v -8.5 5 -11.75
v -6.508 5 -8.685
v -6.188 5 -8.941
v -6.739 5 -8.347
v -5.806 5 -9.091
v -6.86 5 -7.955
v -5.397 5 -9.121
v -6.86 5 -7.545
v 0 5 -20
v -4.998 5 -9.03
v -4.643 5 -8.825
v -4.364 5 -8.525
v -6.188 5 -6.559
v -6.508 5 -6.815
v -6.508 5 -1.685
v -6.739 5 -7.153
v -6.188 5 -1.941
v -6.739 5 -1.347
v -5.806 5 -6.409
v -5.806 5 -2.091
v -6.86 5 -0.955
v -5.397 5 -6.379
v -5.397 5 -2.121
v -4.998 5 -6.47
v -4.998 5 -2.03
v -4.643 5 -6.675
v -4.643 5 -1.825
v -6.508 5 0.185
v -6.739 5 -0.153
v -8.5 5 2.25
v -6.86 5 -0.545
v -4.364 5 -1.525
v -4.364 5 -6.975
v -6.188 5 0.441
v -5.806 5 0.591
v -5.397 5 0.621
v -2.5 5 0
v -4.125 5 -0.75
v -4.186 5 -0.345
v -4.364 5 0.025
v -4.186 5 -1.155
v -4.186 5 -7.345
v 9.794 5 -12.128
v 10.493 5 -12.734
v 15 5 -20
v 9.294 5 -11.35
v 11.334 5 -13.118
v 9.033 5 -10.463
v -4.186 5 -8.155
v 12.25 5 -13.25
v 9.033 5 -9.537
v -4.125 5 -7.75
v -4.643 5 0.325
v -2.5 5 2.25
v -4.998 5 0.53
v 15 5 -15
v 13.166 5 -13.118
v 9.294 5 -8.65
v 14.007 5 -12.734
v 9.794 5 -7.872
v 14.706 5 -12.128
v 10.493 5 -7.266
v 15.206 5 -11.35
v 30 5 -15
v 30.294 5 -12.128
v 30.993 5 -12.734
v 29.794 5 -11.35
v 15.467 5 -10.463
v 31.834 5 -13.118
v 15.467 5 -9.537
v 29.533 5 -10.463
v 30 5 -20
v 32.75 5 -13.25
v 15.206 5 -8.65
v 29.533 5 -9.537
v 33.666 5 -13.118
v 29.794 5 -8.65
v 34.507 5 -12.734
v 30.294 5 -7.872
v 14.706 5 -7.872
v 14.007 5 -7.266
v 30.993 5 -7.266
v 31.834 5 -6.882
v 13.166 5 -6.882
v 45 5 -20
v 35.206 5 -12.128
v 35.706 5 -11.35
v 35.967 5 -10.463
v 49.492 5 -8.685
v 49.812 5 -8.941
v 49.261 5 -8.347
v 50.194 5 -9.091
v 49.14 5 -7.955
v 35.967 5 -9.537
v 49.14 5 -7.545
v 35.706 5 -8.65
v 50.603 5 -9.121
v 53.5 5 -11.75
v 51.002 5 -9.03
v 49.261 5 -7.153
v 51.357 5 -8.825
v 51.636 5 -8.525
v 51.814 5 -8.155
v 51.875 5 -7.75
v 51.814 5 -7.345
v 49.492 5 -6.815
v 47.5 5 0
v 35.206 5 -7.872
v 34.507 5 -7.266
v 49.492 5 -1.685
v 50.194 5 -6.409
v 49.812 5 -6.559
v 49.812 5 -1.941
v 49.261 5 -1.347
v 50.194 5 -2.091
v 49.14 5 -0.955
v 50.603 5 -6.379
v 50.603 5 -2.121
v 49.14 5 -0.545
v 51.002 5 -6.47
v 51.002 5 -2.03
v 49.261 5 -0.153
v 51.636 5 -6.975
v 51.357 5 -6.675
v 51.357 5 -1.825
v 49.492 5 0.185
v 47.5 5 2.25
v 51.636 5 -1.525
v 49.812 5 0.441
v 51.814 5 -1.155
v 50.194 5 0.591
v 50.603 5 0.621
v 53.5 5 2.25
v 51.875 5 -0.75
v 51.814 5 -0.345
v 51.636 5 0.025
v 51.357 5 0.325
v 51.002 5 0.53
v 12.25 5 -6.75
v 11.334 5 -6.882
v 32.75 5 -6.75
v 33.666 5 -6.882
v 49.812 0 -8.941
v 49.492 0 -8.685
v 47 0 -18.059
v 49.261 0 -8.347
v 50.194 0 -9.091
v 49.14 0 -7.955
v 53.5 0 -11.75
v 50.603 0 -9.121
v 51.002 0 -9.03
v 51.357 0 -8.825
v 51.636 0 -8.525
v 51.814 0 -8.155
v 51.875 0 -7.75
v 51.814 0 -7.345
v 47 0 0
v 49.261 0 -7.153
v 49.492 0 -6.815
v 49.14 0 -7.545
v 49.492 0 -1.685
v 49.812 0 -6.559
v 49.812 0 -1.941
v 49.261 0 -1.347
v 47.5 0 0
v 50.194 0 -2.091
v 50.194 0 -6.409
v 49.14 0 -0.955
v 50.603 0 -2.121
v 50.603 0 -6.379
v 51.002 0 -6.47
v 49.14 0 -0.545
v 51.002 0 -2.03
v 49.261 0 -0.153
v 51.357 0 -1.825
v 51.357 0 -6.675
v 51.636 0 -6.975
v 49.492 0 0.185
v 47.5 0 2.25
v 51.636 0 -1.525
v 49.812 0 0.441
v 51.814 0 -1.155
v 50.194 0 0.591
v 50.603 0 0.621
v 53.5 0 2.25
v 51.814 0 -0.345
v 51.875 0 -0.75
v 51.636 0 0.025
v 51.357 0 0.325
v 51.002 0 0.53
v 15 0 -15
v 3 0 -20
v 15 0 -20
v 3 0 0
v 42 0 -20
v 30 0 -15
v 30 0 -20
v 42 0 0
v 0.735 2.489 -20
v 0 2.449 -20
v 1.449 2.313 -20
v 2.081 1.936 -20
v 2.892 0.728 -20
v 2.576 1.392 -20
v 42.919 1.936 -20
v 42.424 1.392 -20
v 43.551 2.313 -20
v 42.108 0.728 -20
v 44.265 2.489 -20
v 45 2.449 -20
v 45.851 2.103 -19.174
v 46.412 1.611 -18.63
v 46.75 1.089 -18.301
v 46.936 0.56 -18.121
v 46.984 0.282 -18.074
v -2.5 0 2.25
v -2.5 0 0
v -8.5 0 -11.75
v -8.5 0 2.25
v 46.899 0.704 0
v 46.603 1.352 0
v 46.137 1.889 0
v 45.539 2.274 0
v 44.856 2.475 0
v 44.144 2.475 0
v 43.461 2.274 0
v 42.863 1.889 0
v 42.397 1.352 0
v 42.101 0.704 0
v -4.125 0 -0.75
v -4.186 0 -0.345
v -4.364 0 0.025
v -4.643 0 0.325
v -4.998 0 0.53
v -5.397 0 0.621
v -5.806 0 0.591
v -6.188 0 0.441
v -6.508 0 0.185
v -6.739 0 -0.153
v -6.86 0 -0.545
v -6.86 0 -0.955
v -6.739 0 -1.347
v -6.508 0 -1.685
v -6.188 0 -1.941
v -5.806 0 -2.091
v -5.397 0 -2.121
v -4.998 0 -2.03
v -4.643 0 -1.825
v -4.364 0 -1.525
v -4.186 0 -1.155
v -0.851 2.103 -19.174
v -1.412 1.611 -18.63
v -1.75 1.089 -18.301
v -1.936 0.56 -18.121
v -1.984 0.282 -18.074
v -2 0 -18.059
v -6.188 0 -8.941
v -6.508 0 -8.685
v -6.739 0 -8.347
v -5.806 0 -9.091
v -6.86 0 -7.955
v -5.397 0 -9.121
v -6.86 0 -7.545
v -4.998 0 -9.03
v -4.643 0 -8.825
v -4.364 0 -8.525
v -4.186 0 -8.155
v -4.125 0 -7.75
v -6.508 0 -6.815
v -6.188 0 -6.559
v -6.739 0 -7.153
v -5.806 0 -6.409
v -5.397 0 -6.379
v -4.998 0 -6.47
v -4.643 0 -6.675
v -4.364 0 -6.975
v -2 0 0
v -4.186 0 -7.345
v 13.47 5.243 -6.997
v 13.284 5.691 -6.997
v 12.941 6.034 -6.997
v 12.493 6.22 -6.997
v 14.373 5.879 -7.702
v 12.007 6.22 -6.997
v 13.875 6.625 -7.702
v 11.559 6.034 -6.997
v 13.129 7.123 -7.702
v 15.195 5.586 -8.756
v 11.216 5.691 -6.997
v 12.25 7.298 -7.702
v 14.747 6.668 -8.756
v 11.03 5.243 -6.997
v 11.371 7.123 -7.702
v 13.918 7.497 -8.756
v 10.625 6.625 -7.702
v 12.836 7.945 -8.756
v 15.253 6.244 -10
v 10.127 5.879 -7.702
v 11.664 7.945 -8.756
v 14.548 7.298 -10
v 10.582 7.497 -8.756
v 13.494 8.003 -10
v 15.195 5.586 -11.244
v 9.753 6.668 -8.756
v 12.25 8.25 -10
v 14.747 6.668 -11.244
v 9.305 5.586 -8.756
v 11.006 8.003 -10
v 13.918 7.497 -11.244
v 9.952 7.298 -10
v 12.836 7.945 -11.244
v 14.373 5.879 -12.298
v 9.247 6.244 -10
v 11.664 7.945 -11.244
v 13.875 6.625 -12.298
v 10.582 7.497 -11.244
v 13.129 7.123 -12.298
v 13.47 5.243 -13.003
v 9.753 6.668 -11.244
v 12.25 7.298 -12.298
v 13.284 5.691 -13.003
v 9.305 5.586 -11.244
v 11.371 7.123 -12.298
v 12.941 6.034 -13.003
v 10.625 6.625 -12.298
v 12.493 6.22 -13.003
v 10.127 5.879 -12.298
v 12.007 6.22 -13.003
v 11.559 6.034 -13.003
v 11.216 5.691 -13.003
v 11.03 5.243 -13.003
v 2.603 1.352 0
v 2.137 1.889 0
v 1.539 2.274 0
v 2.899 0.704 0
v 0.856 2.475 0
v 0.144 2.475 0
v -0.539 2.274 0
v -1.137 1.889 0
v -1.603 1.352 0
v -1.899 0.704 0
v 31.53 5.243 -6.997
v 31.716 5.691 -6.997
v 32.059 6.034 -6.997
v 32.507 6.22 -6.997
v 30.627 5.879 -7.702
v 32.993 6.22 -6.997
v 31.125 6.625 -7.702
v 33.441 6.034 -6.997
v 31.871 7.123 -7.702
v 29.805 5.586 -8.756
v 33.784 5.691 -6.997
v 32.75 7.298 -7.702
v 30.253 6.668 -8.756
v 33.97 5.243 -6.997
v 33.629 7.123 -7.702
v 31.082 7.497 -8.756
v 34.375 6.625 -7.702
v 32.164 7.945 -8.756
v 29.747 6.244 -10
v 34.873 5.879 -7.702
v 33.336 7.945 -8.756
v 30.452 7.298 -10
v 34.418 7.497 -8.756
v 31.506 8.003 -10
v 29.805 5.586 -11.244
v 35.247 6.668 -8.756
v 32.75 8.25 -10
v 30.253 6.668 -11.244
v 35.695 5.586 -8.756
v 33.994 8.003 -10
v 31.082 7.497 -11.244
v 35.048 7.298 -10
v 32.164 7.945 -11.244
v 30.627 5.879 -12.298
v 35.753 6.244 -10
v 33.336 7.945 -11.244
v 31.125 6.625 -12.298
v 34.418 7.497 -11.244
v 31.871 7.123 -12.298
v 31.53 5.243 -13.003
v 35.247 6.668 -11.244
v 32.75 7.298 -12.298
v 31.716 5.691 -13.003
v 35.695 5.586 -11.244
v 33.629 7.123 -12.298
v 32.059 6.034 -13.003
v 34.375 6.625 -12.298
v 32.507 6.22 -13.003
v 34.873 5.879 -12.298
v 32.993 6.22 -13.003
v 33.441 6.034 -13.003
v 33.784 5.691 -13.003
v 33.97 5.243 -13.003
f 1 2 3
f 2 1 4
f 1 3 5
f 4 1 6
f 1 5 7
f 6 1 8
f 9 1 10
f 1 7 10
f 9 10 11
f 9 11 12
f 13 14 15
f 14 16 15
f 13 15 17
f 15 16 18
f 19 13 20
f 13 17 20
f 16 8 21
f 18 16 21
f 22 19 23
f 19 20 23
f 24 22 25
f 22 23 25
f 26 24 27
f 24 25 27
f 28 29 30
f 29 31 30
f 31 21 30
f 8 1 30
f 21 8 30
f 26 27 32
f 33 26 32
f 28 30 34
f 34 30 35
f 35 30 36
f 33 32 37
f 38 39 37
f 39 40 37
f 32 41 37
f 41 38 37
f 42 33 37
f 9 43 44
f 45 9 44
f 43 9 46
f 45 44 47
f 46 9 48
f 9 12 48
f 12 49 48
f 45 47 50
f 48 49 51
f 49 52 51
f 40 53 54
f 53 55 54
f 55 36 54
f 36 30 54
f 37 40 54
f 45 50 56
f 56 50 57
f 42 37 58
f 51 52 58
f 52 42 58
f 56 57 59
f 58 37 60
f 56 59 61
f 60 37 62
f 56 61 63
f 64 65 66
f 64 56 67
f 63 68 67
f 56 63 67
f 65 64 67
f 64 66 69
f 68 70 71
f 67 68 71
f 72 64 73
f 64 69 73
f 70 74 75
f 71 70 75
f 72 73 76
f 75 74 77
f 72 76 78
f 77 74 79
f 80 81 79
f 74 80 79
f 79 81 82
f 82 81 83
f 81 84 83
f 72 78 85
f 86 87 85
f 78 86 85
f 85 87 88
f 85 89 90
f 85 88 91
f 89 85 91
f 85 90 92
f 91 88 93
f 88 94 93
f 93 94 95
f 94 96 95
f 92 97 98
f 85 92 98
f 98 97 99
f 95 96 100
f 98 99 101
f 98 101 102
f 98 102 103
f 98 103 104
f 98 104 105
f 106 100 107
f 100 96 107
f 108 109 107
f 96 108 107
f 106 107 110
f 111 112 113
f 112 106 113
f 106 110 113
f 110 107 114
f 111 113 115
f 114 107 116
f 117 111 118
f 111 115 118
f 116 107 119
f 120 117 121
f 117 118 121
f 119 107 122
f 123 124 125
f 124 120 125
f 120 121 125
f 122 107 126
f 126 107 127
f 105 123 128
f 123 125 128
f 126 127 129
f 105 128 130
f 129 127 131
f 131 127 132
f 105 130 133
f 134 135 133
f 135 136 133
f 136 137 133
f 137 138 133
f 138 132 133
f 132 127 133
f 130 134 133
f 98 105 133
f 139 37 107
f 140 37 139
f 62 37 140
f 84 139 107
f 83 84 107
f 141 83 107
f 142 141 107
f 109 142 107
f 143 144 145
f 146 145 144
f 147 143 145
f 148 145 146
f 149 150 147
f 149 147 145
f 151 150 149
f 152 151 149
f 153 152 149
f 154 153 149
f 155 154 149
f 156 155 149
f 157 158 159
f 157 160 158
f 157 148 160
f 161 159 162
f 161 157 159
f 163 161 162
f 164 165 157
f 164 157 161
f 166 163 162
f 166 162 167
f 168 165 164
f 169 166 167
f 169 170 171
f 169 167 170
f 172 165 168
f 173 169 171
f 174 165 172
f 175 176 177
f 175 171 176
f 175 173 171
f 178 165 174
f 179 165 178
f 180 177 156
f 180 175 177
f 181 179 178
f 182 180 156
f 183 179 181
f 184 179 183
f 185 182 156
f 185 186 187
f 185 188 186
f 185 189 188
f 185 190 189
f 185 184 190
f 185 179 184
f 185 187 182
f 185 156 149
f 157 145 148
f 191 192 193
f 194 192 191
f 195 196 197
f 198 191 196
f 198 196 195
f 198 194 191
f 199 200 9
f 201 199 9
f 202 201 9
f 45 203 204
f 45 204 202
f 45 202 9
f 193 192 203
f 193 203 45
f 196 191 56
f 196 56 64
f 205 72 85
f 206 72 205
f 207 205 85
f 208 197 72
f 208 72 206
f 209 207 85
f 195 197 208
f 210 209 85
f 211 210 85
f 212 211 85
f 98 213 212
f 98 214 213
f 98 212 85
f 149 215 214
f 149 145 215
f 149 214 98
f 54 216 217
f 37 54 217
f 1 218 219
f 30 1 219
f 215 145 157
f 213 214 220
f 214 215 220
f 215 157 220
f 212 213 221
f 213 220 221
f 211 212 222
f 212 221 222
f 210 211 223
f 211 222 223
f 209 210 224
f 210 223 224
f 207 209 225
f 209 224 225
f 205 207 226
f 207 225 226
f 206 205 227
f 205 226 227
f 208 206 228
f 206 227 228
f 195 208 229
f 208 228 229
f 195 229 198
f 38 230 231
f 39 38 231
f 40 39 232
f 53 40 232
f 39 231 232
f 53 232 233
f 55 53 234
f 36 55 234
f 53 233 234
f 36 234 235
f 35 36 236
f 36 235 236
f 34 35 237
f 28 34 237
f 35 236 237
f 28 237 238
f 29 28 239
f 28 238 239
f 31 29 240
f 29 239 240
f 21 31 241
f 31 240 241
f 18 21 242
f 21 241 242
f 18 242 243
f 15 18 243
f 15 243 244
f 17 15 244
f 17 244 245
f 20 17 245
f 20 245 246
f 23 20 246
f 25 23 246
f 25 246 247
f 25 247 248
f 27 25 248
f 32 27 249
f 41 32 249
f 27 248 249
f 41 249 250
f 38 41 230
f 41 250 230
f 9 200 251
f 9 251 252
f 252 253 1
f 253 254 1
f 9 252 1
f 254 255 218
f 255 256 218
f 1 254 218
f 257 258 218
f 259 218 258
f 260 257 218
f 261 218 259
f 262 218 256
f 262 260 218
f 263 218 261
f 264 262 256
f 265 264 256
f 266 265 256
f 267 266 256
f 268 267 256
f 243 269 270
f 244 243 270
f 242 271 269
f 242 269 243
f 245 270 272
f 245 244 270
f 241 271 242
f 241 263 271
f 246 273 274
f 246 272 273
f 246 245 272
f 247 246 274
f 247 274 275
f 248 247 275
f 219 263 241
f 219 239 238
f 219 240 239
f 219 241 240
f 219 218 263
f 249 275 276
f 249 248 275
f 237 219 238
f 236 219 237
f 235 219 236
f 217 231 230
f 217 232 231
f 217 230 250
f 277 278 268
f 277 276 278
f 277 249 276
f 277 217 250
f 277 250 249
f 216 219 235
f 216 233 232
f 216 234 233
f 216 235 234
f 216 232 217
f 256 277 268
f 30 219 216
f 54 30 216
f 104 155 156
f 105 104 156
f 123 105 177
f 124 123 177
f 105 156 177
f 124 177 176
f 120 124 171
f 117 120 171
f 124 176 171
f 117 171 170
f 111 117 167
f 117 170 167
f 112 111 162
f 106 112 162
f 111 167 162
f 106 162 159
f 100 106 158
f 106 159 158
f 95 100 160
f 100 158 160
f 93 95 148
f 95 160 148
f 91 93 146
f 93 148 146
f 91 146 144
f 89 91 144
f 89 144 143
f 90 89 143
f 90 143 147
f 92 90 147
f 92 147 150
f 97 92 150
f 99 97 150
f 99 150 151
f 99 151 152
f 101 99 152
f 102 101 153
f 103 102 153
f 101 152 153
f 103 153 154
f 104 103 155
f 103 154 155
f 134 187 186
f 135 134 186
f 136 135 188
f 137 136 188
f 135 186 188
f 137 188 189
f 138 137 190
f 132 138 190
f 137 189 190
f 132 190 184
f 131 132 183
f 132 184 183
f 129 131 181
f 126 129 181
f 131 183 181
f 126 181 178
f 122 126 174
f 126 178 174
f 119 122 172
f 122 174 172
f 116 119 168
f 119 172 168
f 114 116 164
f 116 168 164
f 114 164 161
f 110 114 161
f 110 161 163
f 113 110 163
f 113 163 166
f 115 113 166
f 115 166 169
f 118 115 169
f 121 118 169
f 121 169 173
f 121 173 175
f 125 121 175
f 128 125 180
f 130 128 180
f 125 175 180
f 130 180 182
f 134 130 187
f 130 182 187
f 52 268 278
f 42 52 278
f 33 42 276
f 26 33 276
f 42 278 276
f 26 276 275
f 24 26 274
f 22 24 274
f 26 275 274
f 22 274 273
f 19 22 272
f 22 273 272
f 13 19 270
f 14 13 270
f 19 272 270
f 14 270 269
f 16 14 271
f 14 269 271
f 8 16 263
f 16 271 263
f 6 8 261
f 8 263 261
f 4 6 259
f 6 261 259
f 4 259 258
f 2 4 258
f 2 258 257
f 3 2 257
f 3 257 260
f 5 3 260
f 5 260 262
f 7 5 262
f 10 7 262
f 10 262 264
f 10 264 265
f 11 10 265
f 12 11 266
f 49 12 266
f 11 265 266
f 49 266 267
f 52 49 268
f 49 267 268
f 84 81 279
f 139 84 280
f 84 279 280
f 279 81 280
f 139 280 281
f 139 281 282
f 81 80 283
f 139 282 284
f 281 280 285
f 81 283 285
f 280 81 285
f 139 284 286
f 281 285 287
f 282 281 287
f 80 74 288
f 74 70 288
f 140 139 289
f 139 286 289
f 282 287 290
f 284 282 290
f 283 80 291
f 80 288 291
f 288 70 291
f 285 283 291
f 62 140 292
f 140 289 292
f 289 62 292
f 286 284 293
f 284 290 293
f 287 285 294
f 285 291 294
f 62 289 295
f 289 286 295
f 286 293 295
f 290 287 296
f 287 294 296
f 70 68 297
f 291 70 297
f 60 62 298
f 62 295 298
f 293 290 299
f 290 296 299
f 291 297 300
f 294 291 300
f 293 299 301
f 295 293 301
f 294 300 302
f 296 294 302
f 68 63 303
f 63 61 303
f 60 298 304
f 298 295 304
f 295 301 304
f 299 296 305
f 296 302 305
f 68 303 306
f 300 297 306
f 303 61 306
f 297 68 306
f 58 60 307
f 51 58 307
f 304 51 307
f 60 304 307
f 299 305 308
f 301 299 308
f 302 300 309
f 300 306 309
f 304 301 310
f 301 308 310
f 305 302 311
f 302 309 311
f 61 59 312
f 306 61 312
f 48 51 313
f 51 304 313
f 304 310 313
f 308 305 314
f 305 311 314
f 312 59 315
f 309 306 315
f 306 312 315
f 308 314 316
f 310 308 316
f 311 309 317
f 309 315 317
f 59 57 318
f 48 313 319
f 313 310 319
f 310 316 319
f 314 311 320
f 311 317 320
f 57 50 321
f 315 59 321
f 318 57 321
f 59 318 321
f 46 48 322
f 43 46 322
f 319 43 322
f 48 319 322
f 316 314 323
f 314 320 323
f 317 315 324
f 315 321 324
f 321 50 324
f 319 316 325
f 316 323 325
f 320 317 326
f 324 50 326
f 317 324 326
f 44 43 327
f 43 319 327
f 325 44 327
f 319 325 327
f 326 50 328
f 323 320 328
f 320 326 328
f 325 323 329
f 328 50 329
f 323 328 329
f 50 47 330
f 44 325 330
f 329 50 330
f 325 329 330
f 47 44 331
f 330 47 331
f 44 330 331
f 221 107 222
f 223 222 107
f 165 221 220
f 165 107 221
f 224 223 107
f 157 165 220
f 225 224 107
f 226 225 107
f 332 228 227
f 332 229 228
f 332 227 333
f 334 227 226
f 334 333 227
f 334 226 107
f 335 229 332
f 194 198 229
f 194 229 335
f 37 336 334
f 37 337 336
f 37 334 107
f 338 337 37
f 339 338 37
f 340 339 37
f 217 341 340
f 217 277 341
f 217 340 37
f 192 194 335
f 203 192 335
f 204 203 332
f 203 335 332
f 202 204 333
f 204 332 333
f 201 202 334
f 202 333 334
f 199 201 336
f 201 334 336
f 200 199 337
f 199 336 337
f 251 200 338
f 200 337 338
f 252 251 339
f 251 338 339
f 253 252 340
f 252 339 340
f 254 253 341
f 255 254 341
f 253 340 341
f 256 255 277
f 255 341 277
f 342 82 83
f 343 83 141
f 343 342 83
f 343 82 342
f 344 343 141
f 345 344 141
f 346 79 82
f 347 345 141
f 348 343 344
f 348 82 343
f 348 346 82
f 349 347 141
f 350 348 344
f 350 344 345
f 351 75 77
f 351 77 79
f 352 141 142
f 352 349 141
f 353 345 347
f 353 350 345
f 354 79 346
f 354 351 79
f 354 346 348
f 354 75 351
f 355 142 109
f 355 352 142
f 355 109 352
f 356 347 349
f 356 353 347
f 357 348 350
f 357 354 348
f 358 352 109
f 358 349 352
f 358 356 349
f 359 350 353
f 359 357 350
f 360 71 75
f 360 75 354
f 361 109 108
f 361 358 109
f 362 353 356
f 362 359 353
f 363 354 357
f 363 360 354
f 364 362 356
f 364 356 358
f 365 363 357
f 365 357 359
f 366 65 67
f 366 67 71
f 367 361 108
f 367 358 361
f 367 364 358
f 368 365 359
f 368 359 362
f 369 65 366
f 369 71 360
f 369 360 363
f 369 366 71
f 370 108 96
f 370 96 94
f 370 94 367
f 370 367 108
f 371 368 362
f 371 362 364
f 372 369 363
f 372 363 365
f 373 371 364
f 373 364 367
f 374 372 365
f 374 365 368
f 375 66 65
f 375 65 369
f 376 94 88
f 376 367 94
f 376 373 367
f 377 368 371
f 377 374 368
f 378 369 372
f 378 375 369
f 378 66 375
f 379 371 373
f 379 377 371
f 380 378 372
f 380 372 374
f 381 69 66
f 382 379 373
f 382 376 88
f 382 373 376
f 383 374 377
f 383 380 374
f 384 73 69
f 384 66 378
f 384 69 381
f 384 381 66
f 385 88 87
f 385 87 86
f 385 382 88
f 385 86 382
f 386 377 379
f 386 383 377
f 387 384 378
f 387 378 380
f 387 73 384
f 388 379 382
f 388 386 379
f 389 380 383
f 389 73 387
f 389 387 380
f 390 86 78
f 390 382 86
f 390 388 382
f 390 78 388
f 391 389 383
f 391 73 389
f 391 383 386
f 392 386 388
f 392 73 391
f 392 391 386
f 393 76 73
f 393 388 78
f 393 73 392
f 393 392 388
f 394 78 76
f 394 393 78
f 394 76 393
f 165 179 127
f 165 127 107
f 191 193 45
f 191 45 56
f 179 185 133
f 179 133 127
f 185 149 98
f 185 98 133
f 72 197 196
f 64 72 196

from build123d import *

# Parameters (mm, degrees)
SKETCH1_W               = 45
SKETCH1_H               = 20
BRACKETBASE_DEPTH       = 5
SKETCH3_R               = 1.375
MOUNTINGTABS_DEPTH      = 5
SKETCH4_W               = 15
SKETCH4_H               = 5
HEADERSLOT_DEPTH        = 13.625
SKETCH6_R               = 2.5
CUT_EXTRUDE1_DEPTH      = 3.25
CUT_EXTRUDE1_DEPTH_BACK = 21


with BuildPart() as part:
    # Sketch1 → bracketBase (new body)
    with BuildSketch(Plane(origin=(0, 0, 0), x_dir=(1, 0, 0), z_dir=(0, 1, 0))):
        with Locations((22.5, 10)):
            Rectangle(SKETCH1_W, SKETCH1_H)
    extrude(amount=BRACKETBASE_DEPTH)

    # Sketch2 → ballPoint1 (revolve)
    with BuildSketch(Plane(origin=(0, 5, 0), x_dir=(1, 0, 0), z_dir=(0, 1, 0))):
        with BuildLine():
            Line((12.25, 13.25), (12.25, 6.75))
            ThreePointArc((12.25, 6.75), (9, 10), (12.25, 13.25))
        make_face()
    ballpoint1 = revolve(axis=Axis((12.25, 5, -13.25), (0, 0, 1)))

    # Mirror1: ballPoint1 across plane
    add(ballpoint1.mirror(Plane.ZY.offset(-22.5)))

    # Sketch3 → mountingTabs (add)
    with BuildSketch(Plane.XZ):
        Polygon((45, -20), (53.5, -11.75), (53.5, 2.25), (47.5, 2.25), (47.5, 0), (45, 0), align=None)
        with Locations((50.5, -0.75)):
            Circle(SKETCH3_R, mode=Mode.SUBTRACT)
        with Locations((50.5, -7.75)):
            Circle(SKETCH3_R, mode=Mode.SUBTRACT)
        Polygon((-2.5, 0), (0, 0), (0, -20), (-8.5, -11.75), (-8.5, 2.25), (-2.5, 2.25), align=None)
        with Locations((-5.5, -0.75)):
            Circle(SKETCH3_R, mode=Mode.SUBTRACT)
        with Locations((-5.5, -7.75)):
            Circle(SKETCH3_R, mode=Mode.SUBTRACT)
    extrude(amount=-MOUNTINGTABS_DEPTH)

    # Sketch4 → headerSlot (cut)
    with BuildSketch(Plane.XZ):
        with Locations((22.5, -17.5)):
            Rectangle(SKETCH4_W, SKETCH4_H)
    extrude(amount=-HEADERSLOT_DEPTH, mode=Mode.SUBTRACT)

    # Sketch6 → Cut-Extrude1 (cut, two sides)
    with BuildSketch(Plane.XY) as cut_extrude1_sk:
        with Locations((44.5, 0)):
            Circle(SKETCH6_R)
        with Locations((0.5, 0)):
            Circle(SKETCH6_R)
    extrude(amount=CUT_EXTRUDE1_DEPTH, mode=Mode.SUBTRACT)
    extrude(cut_extrude1_sk.sketch, amount=-CUT_EXTRUDE1_DEPTH_BACK, mode=Mode.SUBTRACT)


solid = part.part
